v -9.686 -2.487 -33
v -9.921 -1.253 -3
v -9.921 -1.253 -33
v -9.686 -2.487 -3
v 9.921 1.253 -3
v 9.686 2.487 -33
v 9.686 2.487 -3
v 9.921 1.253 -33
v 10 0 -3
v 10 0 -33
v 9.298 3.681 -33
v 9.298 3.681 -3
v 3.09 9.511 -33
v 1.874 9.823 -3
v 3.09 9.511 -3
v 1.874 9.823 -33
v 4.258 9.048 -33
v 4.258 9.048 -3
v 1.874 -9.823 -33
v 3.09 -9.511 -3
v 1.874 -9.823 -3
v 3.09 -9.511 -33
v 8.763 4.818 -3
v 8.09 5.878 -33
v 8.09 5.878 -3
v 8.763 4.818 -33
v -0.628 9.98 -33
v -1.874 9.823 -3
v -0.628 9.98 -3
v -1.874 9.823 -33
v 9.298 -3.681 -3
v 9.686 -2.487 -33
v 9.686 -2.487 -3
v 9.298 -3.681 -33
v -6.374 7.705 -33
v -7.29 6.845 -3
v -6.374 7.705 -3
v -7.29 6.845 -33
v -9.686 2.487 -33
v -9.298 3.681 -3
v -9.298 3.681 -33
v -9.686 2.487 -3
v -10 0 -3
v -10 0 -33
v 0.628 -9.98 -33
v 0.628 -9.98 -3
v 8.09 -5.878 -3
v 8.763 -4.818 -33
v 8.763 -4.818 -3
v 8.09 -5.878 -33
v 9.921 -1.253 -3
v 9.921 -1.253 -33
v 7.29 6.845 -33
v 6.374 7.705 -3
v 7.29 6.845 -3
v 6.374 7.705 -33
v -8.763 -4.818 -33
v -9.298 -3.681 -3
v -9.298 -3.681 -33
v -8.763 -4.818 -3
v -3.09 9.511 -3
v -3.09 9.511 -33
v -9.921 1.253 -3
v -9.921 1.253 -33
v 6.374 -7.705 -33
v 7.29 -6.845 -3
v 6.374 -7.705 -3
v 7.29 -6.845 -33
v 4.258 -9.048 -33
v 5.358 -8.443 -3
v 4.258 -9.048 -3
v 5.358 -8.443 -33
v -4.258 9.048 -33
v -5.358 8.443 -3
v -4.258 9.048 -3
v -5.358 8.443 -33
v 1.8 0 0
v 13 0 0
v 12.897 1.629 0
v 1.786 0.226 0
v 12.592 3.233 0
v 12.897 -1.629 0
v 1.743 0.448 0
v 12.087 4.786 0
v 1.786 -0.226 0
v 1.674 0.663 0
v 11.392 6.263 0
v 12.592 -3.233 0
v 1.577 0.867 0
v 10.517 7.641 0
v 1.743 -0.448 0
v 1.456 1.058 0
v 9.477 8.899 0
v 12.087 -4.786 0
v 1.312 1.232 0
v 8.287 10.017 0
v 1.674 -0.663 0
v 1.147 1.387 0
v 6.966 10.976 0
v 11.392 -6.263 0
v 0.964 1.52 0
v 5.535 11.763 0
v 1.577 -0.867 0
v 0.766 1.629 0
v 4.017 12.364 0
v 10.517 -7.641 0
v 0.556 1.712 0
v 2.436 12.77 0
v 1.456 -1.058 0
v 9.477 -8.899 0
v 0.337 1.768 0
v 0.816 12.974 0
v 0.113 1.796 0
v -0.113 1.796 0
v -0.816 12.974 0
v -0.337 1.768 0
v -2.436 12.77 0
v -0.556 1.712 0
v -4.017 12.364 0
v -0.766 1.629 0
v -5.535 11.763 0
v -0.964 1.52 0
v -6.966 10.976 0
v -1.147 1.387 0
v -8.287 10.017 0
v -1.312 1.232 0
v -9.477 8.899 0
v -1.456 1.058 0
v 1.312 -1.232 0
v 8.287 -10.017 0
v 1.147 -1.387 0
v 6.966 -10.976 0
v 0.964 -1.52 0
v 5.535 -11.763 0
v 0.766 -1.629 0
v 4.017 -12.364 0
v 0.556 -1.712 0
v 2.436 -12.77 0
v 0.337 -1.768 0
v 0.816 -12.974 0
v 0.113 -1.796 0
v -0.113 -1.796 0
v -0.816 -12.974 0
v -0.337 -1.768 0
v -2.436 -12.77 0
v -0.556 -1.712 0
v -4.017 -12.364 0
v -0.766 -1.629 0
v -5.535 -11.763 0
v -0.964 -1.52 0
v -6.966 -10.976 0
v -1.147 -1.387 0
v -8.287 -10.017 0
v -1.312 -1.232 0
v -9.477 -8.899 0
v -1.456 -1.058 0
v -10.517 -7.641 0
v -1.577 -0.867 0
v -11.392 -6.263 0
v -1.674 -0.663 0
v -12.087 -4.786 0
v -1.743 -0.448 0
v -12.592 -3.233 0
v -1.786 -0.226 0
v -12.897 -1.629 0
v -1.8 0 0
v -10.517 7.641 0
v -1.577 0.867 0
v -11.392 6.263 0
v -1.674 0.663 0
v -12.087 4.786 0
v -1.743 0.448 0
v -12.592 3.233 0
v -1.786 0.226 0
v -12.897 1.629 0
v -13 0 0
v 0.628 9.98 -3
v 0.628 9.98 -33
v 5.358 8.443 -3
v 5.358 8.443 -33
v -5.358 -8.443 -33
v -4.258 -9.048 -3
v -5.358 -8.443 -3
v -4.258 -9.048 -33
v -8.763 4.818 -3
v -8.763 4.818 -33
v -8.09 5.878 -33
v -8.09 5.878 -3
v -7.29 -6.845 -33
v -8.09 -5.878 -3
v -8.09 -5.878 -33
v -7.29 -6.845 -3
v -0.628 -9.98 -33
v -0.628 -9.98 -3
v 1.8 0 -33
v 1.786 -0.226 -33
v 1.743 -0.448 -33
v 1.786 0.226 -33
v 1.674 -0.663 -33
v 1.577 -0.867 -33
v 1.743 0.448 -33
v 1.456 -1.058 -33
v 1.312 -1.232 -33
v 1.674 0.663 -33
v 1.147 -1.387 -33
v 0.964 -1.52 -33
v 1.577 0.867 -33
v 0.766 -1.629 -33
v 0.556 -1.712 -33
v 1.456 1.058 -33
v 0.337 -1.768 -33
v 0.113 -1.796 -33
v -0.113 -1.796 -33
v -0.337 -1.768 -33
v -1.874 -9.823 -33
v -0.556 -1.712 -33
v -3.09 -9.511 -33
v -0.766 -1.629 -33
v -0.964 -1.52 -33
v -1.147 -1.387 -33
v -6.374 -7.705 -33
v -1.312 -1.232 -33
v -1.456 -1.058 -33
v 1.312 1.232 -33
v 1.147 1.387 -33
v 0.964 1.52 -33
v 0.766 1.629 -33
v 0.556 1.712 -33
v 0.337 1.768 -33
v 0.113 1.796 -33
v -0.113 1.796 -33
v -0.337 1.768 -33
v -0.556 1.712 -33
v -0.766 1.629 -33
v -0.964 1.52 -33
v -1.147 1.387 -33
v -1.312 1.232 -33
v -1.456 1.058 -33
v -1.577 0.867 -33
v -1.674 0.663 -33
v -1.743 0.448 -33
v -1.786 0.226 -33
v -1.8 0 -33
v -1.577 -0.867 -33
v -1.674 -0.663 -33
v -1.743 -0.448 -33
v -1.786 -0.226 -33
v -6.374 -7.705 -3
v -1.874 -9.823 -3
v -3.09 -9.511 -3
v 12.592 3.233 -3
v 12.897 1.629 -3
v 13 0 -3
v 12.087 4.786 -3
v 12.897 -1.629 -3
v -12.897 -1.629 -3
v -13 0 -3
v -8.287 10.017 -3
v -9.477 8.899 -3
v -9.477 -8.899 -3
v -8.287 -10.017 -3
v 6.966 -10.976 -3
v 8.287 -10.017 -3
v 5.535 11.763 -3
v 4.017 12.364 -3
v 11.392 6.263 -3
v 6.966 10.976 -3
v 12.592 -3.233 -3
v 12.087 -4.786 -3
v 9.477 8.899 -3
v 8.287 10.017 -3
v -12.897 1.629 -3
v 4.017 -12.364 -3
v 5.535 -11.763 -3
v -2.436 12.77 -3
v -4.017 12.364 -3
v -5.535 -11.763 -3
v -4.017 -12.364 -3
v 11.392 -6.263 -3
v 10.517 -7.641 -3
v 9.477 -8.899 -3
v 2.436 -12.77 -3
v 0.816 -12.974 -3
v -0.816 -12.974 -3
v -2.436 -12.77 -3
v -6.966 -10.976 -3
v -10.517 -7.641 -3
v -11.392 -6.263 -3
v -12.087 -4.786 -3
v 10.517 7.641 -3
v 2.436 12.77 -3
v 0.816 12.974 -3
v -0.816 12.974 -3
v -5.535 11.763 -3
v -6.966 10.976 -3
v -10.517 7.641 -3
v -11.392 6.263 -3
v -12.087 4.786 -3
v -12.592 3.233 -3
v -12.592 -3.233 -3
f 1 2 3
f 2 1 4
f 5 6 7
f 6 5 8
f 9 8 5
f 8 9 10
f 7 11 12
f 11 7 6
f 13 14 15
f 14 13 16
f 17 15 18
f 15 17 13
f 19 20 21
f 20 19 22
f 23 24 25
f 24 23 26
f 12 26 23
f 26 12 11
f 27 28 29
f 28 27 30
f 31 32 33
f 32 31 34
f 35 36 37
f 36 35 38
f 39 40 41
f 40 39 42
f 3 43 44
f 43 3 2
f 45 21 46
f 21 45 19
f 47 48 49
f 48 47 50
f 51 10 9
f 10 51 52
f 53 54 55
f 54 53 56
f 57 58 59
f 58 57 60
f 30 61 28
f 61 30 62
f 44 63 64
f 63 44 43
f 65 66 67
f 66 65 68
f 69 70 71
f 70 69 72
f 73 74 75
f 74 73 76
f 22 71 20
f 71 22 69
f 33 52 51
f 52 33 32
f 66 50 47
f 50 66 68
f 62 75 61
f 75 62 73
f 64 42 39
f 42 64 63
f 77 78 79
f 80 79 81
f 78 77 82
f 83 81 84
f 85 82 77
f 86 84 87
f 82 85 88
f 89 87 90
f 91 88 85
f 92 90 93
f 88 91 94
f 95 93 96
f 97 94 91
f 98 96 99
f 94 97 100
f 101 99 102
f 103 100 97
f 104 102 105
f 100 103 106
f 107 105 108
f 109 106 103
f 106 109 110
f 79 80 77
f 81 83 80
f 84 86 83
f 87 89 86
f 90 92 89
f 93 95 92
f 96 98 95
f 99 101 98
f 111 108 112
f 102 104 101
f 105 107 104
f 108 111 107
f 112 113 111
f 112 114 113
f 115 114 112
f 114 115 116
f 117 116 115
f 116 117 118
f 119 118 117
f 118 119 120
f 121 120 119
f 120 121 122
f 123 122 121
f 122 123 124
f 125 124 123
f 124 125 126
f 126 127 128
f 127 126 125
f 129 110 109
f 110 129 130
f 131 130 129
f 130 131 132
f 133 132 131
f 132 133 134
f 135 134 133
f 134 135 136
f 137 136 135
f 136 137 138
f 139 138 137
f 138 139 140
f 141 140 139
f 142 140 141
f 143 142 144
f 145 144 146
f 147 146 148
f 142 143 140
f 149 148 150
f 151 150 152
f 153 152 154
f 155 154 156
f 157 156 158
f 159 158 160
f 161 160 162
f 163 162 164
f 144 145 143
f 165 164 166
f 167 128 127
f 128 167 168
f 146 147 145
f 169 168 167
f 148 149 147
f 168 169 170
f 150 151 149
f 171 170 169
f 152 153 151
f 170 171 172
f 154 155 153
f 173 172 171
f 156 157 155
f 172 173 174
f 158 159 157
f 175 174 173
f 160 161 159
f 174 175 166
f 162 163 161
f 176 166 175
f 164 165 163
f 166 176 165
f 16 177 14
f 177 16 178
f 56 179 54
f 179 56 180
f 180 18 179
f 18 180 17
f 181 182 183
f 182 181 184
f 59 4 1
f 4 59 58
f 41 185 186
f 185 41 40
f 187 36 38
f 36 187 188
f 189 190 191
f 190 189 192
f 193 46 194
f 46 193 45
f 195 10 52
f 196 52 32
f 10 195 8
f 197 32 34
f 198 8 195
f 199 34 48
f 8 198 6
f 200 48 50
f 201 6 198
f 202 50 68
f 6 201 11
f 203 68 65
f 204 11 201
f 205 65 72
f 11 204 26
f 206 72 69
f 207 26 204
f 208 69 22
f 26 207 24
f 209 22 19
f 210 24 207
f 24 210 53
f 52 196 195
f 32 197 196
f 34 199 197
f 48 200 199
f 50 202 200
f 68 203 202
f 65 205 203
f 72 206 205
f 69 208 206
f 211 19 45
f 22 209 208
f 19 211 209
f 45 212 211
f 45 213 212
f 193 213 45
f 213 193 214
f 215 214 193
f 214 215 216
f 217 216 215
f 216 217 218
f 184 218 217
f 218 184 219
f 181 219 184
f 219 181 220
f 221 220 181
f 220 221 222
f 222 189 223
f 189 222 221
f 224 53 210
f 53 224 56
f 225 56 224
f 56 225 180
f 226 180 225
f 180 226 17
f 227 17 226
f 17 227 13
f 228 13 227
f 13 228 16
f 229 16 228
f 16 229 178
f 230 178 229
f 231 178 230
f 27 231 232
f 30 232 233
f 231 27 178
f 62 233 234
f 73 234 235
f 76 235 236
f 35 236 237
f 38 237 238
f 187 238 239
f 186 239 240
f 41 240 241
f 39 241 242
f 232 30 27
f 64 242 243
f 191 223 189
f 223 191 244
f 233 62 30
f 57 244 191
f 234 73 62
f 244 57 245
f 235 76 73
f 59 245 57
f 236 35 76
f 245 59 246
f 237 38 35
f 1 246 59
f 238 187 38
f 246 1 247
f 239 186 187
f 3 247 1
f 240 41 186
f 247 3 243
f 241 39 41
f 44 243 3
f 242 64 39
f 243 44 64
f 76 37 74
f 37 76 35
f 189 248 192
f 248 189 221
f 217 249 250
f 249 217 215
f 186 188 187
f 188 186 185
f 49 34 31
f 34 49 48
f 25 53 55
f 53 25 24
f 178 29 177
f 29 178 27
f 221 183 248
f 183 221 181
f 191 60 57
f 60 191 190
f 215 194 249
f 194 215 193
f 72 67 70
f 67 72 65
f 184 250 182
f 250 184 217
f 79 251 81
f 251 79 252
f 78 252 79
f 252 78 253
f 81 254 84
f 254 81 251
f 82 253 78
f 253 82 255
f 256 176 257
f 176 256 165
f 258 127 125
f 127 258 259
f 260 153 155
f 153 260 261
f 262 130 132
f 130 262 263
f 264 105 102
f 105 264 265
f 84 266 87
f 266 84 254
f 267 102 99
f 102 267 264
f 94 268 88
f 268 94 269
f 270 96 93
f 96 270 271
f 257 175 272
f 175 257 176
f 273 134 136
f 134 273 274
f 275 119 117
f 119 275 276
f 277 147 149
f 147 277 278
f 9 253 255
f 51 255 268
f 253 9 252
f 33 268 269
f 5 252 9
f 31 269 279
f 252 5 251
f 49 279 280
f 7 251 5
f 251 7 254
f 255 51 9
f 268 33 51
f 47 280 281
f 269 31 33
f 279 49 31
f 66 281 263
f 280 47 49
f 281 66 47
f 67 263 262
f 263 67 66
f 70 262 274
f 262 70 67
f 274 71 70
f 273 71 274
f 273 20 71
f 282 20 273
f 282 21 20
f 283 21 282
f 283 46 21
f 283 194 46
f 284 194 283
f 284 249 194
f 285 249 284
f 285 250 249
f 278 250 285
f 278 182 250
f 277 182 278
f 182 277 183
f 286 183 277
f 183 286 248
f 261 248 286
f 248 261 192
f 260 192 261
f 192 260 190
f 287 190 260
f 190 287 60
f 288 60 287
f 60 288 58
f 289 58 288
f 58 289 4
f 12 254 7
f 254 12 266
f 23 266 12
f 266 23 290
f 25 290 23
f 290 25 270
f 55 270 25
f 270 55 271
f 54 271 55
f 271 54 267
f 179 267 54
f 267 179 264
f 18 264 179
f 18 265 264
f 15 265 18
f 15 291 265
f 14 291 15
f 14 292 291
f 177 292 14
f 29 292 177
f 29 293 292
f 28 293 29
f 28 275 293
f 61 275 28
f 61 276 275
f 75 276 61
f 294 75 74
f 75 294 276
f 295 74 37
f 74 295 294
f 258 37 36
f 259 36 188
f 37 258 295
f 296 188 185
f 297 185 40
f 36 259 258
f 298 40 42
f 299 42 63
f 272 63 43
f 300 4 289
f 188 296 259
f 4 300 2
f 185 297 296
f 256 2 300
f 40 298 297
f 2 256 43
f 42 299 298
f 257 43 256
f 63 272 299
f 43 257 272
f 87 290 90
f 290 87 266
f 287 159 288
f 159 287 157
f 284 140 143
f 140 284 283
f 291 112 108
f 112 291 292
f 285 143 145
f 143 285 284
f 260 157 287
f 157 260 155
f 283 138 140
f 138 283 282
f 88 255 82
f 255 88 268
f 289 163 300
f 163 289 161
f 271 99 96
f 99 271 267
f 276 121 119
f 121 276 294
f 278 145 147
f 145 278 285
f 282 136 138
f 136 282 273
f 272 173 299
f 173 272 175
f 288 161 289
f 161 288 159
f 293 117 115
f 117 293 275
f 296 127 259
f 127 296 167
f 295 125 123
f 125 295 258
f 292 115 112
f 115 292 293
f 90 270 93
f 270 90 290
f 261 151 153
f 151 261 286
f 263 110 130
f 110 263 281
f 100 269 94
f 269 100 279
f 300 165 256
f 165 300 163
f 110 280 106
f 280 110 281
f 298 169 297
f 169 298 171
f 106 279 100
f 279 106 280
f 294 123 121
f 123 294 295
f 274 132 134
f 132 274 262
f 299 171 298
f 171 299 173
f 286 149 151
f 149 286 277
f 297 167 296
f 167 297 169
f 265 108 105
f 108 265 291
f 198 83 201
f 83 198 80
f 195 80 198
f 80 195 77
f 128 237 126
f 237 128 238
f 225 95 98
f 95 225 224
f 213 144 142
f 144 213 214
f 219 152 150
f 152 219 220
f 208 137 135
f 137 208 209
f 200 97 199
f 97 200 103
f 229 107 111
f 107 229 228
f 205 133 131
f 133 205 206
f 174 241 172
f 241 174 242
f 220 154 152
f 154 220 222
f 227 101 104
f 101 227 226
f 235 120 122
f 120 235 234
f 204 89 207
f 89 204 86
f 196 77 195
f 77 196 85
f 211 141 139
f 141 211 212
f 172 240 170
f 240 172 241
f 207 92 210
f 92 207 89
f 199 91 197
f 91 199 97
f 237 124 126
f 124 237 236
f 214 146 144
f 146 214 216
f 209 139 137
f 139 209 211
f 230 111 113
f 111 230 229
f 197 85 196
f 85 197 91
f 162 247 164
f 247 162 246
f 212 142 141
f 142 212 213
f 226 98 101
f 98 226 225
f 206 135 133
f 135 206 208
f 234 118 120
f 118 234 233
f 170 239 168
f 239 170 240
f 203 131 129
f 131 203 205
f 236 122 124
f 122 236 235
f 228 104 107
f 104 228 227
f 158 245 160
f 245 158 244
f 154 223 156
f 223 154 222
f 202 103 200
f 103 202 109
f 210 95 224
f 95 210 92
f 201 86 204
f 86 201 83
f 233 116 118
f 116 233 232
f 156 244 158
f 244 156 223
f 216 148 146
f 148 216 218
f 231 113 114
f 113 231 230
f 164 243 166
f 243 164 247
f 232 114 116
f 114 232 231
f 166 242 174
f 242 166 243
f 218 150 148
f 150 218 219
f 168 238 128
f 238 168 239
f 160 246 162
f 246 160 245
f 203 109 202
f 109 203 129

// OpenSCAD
$fn = 50;


difference() {
	union() {
		translate(v = [0, 0, -33.0000000000]) {
			cylinder(h = 33, r = 10.0000000000);
		}
		translate(v = [0, 0, -3.0000000000]) {
			cylinder(h = 3, r = 13.0000000000);
		}
	}
	union() {
		#translate(v = [0, 0, -33]) {
			cylinder(h = 33, r = 1.8000000000);
		}
	}
}
